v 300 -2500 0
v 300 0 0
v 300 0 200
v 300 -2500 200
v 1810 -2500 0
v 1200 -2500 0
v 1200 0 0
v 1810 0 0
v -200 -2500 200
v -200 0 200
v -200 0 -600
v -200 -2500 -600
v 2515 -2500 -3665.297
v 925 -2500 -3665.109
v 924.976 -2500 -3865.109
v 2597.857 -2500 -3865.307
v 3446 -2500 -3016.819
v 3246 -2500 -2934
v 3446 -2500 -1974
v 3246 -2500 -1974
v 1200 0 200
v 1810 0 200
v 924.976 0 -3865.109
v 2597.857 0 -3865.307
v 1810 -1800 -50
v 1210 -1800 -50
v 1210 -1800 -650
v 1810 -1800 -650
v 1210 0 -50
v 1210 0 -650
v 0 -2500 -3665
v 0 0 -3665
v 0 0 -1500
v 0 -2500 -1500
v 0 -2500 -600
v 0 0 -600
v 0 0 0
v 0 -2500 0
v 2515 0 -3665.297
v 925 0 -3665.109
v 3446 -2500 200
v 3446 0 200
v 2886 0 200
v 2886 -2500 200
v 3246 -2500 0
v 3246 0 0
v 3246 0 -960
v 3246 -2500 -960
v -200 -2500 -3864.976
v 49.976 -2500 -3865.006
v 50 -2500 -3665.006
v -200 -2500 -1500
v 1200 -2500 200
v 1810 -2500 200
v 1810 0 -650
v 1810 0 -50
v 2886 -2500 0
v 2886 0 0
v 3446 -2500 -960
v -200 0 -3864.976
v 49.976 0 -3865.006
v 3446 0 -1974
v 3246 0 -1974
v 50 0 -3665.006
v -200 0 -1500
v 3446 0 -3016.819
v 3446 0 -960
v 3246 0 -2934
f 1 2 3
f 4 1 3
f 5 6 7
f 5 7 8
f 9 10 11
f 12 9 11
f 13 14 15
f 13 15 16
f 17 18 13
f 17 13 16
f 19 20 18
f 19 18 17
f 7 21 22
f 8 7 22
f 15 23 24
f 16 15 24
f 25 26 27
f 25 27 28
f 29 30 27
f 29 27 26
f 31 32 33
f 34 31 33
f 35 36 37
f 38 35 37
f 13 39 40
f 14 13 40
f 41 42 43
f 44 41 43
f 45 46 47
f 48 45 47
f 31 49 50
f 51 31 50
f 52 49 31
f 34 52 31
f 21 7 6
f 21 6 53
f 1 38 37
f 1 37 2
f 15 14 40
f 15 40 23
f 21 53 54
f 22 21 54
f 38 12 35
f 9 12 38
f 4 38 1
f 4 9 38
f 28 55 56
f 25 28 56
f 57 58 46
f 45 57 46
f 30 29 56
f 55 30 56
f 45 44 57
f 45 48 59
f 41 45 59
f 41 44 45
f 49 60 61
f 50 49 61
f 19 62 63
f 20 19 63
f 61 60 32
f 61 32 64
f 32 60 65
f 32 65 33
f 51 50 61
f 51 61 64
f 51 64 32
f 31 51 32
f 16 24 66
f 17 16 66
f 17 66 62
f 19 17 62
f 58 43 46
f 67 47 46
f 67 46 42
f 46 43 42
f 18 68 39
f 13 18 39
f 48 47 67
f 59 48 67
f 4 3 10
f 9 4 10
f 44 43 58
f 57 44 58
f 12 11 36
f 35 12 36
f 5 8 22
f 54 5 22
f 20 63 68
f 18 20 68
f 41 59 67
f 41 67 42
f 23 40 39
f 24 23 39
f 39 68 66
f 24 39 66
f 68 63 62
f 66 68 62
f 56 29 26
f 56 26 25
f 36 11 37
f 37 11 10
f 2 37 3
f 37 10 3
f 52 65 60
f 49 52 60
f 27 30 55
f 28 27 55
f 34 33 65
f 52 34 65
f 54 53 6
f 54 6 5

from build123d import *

# Parameters (mm, degrees)
F0_W     = 610
F0_H     = 200
F1_DEPTH = 2500
F2_W     = 600
F2_H     = 600
F3_DEPTH = 1800


with BuildPart() as f1:
    # F0 (on Front) → F1 (new body)
    with BuildSketch(Plane.XZ):
        Polygon((0, -600), (0, 0), (300, 0), (300, 200), (-200, 200), (-200, -600), align=None)
        with Locations((1505, 100)):
            Rectangle(F0_W, F0_H)
        Polygon((2886, 200), (2886, 0), (3246, 0), (3246, -960), (3446, -960), (3446, 200), align=None)
        Polygon((3446, -1974), (3246, -1974), (3246, -2934), (2514.999982, -3665.296776), (924.999994, -3665.109152), (924.976393, -3865.109151), (2597.856697, -3865.306555), (3446, -3016.818938), align=None)
        Polygon((50, -3665.0059), (0, -3665), (0, -1500), (-200, -1500), (-200, -3864.976401), (49.976399, -3865.005899), align=None)
    extrude(amount=F1_DEPTH)


with BuildPart() as f3:
    # F2 (on Front) → F3 (new body)
    with BuildSketch(Plane.XZ):
        with Locations((1510, -350)):
            Rectangle(F2_W, F2_H)
    extrude(amount=F3_DEPTH)


solid = Compound([f1.part, f3.part])
